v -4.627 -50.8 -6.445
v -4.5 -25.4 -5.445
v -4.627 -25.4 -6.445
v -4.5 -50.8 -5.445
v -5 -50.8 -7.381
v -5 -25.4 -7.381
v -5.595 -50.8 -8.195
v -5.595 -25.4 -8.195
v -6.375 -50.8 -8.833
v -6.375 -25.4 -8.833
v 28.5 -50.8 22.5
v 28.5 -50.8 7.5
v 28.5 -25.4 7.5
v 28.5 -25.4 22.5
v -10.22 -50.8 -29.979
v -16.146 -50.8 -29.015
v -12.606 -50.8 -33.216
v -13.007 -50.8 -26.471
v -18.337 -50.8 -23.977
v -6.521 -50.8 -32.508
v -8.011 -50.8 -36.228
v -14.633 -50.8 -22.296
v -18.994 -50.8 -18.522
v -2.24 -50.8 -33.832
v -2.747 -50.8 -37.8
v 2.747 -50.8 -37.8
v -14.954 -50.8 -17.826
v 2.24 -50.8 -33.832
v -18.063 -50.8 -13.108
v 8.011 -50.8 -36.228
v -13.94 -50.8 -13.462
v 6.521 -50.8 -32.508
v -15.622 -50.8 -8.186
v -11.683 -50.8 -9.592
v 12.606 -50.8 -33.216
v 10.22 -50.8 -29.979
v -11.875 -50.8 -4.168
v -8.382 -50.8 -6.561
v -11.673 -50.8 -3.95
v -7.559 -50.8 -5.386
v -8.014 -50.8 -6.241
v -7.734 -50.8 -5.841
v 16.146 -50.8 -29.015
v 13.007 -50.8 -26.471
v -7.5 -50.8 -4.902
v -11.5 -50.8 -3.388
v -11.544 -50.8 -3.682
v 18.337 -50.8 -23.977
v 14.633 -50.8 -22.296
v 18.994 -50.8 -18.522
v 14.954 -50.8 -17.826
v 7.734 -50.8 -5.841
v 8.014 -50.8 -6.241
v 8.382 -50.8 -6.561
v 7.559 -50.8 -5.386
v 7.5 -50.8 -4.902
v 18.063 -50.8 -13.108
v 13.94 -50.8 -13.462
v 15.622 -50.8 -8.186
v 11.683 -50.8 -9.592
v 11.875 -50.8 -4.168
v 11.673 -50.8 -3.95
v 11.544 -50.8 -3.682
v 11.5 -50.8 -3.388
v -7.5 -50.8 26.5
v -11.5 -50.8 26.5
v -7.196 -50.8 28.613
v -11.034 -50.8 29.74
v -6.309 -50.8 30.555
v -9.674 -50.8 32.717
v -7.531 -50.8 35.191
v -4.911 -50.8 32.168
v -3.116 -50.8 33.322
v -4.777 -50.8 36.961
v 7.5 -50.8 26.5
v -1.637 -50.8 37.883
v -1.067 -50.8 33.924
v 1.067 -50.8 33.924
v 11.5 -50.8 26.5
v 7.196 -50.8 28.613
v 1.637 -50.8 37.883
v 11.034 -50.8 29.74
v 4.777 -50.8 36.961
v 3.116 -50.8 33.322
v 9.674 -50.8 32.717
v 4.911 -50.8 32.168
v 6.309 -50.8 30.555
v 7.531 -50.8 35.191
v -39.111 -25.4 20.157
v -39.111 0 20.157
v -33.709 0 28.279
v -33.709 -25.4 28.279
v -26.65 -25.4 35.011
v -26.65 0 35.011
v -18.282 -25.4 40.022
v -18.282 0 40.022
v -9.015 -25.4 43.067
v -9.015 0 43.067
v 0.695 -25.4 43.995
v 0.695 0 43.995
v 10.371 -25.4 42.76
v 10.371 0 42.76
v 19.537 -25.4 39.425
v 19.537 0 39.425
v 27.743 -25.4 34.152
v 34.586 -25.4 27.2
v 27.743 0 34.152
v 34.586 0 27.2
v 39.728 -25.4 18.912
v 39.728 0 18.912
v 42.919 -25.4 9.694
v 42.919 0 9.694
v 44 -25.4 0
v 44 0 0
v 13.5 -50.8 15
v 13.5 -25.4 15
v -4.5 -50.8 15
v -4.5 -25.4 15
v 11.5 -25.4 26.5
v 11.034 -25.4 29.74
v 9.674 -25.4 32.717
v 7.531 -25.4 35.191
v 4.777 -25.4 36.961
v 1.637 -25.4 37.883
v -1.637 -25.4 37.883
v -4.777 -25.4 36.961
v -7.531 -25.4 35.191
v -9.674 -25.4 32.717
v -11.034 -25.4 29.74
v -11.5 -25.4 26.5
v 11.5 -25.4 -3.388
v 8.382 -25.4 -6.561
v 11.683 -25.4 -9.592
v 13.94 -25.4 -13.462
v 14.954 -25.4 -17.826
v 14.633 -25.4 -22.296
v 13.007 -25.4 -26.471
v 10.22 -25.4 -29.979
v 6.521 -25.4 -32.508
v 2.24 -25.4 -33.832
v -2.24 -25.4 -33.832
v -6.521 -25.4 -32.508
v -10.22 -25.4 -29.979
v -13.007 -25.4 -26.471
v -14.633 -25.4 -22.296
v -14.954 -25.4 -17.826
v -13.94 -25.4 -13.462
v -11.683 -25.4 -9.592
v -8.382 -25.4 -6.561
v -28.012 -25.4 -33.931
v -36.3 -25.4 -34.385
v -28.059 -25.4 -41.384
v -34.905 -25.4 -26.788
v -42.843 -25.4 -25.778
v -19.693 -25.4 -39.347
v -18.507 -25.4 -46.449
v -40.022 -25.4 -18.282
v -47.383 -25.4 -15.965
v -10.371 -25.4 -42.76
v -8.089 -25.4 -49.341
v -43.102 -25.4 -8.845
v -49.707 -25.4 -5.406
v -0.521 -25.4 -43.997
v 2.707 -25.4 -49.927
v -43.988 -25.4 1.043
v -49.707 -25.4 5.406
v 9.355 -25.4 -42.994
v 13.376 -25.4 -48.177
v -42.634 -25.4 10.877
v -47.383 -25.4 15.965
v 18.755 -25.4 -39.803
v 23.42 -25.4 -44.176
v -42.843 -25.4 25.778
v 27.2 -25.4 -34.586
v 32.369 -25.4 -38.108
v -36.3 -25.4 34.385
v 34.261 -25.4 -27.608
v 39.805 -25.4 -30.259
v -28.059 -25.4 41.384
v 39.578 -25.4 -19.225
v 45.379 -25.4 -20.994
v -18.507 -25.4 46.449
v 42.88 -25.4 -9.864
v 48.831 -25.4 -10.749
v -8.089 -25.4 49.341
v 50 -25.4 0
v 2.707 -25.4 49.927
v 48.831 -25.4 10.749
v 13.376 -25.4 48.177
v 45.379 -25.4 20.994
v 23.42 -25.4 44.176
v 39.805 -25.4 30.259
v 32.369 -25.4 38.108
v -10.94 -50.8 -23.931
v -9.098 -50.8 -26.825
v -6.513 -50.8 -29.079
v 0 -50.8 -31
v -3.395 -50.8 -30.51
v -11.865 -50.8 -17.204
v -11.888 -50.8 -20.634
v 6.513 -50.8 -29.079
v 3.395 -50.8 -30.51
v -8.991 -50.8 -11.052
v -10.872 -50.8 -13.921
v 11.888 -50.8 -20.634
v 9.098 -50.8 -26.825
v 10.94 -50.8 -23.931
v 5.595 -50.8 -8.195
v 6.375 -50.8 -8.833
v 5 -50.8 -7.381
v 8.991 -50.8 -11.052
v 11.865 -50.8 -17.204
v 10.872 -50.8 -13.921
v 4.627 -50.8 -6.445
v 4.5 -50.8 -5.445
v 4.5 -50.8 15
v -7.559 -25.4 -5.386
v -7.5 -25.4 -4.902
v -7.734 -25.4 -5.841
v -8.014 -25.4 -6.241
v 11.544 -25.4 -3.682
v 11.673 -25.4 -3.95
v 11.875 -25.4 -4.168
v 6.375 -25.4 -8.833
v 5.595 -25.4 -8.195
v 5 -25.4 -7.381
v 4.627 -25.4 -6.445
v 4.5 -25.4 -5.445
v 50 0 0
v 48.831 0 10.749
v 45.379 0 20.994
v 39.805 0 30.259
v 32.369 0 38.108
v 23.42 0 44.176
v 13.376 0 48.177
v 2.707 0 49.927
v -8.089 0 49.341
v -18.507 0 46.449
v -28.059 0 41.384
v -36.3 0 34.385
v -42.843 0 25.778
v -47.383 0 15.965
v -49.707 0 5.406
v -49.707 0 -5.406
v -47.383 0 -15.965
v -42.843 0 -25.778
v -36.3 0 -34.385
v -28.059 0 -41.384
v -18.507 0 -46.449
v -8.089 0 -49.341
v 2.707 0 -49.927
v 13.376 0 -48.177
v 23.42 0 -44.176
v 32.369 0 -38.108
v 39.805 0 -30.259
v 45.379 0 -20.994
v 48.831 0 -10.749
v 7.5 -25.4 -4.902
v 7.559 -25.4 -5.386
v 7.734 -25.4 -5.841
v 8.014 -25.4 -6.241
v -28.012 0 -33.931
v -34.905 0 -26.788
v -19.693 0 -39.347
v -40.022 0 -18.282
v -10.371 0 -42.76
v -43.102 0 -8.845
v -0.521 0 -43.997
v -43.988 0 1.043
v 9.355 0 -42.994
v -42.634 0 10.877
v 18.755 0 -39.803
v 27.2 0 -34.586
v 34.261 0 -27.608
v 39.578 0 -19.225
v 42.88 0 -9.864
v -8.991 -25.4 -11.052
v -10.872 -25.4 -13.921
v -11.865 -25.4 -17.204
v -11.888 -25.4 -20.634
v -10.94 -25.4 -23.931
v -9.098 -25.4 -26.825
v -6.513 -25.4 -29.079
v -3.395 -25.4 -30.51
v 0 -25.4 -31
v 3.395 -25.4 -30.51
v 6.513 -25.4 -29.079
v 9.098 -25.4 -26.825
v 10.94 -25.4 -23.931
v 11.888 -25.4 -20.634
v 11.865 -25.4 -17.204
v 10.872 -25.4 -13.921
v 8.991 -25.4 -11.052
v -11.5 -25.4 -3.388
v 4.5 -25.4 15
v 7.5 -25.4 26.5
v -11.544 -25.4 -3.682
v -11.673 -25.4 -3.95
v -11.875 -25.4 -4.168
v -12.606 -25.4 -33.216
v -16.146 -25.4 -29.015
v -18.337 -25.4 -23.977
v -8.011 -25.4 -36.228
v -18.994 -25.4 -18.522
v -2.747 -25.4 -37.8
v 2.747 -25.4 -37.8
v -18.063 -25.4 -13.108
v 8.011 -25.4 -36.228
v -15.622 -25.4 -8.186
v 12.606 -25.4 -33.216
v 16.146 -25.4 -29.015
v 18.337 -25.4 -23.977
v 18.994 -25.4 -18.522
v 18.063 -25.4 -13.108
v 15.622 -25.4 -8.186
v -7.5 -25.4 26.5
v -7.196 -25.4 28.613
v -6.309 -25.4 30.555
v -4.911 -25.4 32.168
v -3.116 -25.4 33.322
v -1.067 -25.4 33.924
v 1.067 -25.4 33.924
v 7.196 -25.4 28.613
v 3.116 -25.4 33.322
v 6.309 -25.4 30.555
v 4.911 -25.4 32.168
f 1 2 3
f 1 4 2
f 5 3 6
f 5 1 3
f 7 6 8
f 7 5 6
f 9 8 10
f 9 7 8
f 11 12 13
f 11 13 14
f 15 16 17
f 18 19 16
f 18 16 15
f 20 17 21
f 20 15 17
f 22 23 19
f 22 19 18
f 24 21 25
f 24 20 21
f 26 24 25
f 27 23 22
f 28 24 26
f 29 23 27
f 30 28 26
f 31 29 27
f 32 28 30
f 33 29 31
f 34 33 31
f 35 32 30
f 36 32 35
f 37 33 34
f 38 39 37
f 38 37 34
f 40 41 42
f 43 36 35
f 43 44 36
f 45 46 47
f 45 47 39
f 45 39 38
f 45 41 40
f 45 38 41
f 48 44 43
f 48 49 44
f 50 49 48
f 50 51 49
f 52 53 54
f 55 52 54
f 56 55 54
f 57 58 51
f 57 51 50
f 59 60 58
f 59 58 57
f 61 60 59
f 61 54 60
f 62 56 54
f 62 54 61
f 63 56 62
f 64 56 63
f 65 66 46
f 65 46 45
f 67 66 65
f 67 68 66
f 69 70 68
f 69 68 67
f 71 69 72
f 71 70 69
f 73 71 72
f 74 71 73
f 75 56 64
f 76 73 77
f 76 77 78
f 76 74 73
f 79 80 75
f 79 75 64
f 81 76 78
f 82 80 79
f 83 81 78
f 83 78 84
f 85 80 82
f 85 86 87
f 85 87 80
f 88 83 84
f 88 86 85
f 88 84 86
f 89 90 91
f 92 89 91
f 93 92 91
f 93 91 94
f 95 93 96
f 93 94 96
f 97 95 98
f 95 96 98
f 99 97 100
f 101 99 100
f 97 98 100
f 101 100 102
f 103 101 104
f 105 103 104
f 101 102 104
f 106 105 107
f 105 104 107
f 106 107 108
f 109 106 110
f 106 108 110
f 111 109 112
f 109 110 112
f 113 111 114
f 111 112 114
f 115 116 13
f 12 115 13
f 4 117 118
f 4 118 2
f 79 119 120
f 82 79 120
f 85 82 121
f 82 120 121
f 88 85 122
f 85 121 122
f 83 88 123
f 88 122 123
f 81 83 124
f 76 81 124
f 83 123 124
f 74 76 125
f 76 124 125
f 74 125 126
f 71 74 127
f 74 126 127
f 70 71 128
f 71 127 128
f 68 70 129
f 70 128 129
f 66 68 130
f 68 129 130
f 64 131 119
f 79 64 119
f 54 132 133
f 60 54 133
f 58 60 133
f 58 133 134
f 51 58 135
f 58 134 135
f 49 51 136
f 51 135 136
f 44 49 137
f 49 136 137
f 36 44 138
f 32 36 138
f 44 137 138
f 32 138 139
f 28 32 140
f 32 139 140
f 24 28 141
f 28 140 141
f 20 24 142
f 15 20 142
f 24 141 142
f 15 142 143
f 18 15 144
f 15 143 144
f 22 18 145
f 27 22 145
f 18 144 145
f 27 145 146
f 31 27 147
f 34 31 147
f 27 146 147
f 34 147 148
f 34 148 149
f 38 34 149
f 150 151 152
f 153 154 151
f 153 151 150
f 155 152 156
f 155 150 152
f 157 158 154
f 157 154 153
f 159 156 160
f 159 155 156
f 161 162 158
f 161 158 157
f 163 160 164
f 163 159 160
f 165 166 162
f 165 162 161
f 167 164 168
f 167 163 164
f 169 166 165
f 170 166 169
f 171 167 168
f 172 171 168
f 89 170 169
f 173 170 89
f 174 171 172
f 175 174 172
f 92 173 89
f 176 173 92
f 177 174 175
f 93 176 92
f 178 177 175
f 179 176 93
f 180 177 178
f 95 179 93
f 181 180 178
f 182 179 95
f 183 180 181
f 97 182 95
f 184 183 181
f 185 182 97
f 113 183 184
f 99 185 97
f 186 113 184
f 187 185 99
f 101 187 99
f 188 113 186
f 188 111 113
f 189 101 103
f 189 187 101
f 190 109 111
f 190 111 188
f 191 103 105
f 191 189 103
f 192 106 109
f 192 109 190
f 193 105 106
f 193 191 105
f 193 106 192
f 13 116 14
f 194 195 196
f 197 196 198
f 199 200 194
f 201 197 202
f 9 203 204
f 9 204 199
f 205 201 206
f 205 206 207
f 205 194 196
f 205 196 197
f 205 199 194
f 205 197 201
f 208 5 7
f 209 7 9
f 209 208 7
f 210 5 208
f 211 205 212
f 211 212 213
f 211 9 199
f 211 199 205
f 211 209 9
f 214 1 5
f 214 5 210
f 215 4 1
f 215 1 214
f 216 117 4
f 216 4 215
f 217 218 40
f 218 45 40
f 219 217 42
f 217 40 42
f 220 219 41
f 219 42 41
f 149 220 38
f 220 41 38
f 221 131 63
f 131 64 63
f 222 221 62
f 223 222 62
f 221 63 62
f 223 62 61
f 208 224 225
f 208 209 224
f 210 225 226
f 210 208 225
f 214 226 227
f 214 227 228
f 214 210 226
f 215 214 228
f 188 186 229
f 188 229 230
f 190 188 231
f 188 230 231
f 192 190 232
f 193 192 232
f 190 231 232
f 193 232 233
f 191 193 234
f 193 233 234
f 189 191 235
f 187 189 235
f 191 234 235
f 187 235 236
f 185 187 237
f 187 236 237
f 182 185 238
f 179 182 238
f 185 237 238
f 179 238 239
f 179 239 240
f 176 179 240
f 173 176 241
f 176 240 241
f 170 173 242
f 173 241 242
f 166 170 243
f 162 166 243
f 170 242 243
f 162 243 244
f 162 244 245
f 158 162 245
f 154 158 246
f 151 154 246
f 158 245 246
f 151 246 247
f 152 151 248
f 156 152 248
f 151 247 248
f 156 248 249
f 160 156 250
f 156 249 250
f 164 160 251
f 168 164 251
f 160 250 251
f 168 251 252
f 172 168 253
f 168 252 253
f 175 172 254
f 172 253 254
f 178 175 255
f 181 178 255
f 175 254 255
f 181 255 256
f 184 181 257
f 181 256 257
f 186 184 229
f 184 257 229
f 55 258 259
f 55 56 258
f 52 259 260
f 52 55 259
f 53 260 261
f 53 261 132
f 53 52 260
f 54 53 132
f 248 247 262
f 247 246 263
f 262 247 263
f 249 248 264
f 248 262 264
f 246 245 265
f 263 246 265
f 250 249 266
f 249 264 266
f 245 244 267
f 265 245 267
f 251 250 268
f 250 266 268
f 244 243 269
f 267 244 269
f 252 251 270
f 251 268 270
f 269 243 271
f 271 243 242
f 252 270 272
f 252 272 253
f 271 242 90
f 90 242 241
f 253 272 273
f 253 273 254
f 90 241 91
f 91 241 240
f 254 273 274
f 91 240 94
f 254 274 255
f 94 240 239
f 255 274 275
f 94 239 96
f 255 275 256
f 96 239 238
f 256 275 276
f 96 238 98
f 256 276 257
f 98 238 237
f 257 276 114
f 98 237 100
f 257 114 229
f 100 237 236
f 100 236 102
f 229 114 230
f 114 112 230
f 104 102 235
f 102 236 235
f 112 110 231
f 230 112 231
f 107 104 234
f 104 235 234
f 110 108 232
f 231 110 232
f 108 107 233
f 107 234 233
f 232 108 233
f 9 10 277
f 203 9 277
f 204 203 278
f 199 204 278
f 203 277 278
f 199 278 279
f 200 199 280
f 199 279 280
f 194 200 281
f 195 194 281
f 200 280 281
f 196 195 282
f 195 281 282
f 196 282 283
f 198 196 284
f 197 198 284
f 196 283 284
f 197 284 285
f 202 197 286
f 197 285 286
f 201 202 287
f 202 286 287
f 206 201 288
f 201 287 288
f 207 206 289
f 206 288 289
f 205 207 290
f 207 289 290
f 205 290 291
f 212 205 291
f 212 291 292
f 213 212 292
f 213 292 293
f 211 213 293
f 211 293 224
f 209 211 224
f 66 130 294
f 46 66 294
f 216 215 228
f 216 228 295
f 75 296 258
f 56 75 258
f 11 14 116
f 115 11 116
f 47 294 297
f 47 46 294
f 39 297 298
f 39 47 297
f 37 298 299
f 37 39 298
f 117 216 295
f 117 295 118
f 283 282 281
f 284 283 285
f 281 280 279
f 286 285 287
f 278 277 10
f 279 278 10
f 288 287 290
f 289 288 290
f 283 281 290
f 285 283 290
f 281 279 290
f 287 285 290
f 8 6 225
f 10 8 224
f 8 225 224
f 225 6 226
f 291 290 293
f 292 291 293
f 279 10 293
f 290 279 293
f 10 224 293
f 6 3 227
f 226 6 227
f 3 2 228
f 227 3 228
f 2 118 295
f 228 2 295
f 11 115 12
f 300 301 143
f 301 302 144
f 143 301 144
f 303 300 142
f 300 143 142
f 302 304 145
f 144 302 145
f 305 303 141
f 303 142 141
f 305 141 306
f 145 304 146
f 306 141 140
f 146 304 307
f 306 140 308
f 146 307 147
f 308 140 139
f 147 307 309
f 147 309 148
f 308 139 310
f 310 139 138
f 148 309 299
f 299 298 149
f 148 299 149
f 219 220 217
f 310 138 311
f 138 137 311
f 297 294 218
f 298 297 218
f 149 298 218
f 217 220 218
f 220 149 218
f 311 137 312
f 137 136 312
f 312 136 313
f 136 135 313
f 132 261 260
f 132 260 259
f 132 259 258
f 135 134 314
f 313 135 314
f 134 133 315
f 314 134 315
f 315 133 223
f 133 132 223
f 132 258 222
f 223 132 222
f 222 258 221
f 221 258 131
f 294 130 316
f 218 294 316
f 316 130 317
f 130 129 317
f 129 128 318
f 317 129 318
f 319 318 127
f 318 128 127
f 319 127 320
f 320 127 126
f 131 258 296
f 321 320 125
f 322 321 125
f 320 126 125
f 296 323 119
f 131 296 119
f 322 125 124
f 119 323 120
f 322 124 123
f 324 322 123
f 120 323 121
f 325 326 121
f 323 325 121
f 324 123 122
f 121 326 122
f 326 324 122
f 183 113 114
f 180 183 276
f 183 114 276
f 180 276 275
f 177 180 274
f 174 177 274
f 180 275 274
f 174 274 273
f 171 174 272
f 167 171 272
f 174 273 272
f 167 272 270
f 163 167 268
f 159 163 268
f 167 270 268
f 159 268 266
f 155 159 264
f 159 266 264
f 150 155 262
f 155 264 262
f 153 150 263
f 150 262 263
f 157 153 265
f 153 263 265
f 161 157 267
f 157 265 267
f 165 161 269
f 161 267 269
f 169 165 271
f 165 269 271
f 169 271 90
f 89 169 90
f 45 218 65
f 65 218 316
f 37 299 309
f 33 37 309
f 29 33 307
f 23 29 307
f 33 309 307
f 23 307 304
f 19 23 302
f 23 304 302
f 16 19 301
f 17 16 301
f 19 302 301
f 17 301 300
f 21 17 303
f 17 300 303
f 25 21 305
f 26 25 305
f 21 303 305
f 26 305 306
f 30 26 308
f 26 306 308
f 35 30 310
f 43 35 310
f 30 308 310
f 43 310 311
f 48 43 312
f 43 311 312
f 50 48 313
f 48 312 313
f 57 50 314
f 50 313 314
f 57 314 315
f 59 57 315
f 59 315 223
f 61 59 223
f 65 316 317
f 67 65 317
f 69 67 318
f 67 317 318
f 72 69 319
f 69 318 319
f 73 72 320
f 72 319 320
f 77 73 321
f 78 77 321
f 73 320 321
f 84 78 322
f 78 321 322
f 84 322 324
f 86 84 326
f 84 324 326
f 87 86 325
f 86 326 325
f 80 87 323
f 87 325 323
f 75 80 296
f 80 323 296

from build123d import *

# Parameters (mm, degrees)
F0_R     = 50
F1_DEPTH = 25.4
F2_R     = 1
F3_R     = 2
F4_R     = 1
F5_R     = 2
F8_DEPTH = 25.4
F9_R     = 1
F10_R    = 2
F11_R    = 4


with BuildPart() as f1:
    # F0 (on Front) → F1 (new body)
    with BuildSketch(Plane.XZ):
        Circle(F0_R)
        with BuildLine():
            ThreePointArc((-39.1111111111, 20.1574052808), (10.3708994574, 42.7603138955), (44, 0))
            ThreePointArc((44, 0), (-10.3708994574, -42.7603138955), (-39.1111111111, 20.1574052808))
        make_face(mode=Mode.SUBTRACT)
    extrude(amount=F1_DEPTH)


with BuildPart() as f1b:
    # F0 (on Front) → F1, piece 2 (new body)
    with BuildSketch(Plane.XZ):
        with BuildLine():
            ThreePointArc((0, 16.4924225025), (-16, 26.2462112512), (-32, 16.4924225025))
            Line((-32, 16.4924225025), (-30.2222222222, 15.5761768079))
            Line((-30.2222222222, 15.5761768079), (-34, 8.2462112512))
            ThreePointArc((-34, 8.2462112512), (-33.0849981905, 2.5802747153), (-30.4330181301, -2.5096238003))
            Line((-30.4330181301, -2.5096238003), (0, -43.3470204617))
            Line((0, -43.3470204617), (30.4330181301, -2.5096238003))
            ThreePointArc((30.4330181301, -2.5096238003), (25.5332732557, 23.5143709646), (0, 16.4924225025))
        make_face()
        with BuildLine():
            ThreePointArc((-28.829349449, -1.3145310168), (-31.9458736097, 6.9312531437), (-30.2222222222, 15.5761768079))
            ThreePointArc((-30.2222222222, 15.5761768079), (-12.2287638337, 23.7954163042), (0, 8.2462112512))
            ThreePointArc((0, 8.2462112512), (21.0363880319, 23.4328763095), (28.829349449, -1.3145310168))
            Line((28.829349449, -1.3145310168), (0, -40))
            Line((0, -40), (-28.829349449, -1.3145310168))
        make_face(mode=Mode.SUBTRACT)
        with BuildLine():
            Line((-30.2222222222, 15.5761768079), (-32, 16.4924225025))
            ThreePointArc((-32, 16.4924225025), (-33.4928556845, 12.4888519384), (-34, 8.2462112512))
            Line((-34, 8.2462112512), (-30.2222222222, 15.5761768079))
        make_face()
    extrude(amount=F1_DEPTH)

    # F2
    f2_edges = [f1b.edges().sort_by_distance(p)[0] for p in [
        (0, -12.7, 16.492423),
    ]]
    fillet(f2_edges, radius=F2_R)

    # F3
    f3_edges = [f1b.edges().sort_by_distance(p)[0] for p in [
        (0, -12.7, 8.246211),
    ]]
    fillet(f3_edges, radius=F3_R)

    # F4
    f4_edges = [f1b.edges().sort_by_distance(p)[0] for p in [
        (0, -12.7, -40),
    ]]
    fillet(f4_edges, radius=F4_R)

    # F5
    f5_edges = [f1b.edges().sort_by_distance(p)[0] for p in [
        (0, -12.7, -43.34702),
    ]]
    fillet(f5_edges, radius=F5_R)


with BuildPart() as f8:
    # F7 (on face) → F8 (new body)
    with BuildSketch(Plane.XZ.offset(25.4)):
        with BuildLine():
            ThreePointArc((11.5, 26.5), (0, 38), (-11.5, 26.5))
            Line((-11.5, 26.5), (-11.5, -3.8755165377))
            ThreePointArc((-11.5, -3.8755165377), (0, -38), (11.5, -3.8755165377))
            Line((11.5, -3.8755165377), (11.5, 26.5))
        make_face()
        with BuildLine():
            ThreePointArc((7.5, -6.0096189432), (0, -34), (-7.5, -6.0096189432))
            Line((-7.5, -6.0096189432), (-7.5, 26.5))
            ThreePointArc((-7.5, 26.5), (0, 34), (7.5, 26.5))
            Line((7.5, 26.5), (7.5, -6.0096189432))
        make_face(mode=Mode.SUBTRACT)
    extrude(amount=F8_DEPTH)

    # F9
    f9_edges = [f8.edges().sort_by_distance(p)[0] for p in [
        (11.5, -38.1, -3.875517),
        (-11.5, -38.1, -3.875517),
    ]]
    fillet(f9_edges, radius=F9_R)

    # F10
    f10_edges = [f8.edges().sort_by_distance(p)[0] for p in [
        (-7.5, -38.1, -6.009619),
        (7.5, -38.1, -6.009619),
    ]]
    fillet(f10_edges, radius=F10_R)


with BuildPart() as f8b:
    # F7 (on face) → F8, piece 2 (new body)
    with BuildSketch(Plane.XZ.offset(25.4)):
        Polygon((28.5, 22.5), (13.5, 15), (28.5, 7.5), align=None)
    extrude(amount=F8_DEPTH)


with BuildPart() as f8c:
    # F7 (on face) → F8, piece 3 (new body)
    with BuildSketch(Plane.XZ.offset(25.4)):
        with BuildLine():
            Line((4.5, 15), (-4.5, 15))
            Line((-4.5, 15), (-4.5, -7.8757022694))
            ThreePointArc((-4.5, -7.8757022694), (0, -31), (4.5, -7.8757022694))
            Line((4.5, -7.8757022694), (4.5, 15))
        make_face()
    extrude(amount=F8_DEPTH)

    # F11
    f11_edges = [f8c.edges().sort_by_distance(p)[0] for p in [
        (-4.5, -38.1, -7.875702),
        (4.5, -38.1, -7.875702),
    ]]
    fillet(f11_edges, radius=F11_R)


solid = Compound([f1.part, f8.part, f8b.part, f8c.part])
